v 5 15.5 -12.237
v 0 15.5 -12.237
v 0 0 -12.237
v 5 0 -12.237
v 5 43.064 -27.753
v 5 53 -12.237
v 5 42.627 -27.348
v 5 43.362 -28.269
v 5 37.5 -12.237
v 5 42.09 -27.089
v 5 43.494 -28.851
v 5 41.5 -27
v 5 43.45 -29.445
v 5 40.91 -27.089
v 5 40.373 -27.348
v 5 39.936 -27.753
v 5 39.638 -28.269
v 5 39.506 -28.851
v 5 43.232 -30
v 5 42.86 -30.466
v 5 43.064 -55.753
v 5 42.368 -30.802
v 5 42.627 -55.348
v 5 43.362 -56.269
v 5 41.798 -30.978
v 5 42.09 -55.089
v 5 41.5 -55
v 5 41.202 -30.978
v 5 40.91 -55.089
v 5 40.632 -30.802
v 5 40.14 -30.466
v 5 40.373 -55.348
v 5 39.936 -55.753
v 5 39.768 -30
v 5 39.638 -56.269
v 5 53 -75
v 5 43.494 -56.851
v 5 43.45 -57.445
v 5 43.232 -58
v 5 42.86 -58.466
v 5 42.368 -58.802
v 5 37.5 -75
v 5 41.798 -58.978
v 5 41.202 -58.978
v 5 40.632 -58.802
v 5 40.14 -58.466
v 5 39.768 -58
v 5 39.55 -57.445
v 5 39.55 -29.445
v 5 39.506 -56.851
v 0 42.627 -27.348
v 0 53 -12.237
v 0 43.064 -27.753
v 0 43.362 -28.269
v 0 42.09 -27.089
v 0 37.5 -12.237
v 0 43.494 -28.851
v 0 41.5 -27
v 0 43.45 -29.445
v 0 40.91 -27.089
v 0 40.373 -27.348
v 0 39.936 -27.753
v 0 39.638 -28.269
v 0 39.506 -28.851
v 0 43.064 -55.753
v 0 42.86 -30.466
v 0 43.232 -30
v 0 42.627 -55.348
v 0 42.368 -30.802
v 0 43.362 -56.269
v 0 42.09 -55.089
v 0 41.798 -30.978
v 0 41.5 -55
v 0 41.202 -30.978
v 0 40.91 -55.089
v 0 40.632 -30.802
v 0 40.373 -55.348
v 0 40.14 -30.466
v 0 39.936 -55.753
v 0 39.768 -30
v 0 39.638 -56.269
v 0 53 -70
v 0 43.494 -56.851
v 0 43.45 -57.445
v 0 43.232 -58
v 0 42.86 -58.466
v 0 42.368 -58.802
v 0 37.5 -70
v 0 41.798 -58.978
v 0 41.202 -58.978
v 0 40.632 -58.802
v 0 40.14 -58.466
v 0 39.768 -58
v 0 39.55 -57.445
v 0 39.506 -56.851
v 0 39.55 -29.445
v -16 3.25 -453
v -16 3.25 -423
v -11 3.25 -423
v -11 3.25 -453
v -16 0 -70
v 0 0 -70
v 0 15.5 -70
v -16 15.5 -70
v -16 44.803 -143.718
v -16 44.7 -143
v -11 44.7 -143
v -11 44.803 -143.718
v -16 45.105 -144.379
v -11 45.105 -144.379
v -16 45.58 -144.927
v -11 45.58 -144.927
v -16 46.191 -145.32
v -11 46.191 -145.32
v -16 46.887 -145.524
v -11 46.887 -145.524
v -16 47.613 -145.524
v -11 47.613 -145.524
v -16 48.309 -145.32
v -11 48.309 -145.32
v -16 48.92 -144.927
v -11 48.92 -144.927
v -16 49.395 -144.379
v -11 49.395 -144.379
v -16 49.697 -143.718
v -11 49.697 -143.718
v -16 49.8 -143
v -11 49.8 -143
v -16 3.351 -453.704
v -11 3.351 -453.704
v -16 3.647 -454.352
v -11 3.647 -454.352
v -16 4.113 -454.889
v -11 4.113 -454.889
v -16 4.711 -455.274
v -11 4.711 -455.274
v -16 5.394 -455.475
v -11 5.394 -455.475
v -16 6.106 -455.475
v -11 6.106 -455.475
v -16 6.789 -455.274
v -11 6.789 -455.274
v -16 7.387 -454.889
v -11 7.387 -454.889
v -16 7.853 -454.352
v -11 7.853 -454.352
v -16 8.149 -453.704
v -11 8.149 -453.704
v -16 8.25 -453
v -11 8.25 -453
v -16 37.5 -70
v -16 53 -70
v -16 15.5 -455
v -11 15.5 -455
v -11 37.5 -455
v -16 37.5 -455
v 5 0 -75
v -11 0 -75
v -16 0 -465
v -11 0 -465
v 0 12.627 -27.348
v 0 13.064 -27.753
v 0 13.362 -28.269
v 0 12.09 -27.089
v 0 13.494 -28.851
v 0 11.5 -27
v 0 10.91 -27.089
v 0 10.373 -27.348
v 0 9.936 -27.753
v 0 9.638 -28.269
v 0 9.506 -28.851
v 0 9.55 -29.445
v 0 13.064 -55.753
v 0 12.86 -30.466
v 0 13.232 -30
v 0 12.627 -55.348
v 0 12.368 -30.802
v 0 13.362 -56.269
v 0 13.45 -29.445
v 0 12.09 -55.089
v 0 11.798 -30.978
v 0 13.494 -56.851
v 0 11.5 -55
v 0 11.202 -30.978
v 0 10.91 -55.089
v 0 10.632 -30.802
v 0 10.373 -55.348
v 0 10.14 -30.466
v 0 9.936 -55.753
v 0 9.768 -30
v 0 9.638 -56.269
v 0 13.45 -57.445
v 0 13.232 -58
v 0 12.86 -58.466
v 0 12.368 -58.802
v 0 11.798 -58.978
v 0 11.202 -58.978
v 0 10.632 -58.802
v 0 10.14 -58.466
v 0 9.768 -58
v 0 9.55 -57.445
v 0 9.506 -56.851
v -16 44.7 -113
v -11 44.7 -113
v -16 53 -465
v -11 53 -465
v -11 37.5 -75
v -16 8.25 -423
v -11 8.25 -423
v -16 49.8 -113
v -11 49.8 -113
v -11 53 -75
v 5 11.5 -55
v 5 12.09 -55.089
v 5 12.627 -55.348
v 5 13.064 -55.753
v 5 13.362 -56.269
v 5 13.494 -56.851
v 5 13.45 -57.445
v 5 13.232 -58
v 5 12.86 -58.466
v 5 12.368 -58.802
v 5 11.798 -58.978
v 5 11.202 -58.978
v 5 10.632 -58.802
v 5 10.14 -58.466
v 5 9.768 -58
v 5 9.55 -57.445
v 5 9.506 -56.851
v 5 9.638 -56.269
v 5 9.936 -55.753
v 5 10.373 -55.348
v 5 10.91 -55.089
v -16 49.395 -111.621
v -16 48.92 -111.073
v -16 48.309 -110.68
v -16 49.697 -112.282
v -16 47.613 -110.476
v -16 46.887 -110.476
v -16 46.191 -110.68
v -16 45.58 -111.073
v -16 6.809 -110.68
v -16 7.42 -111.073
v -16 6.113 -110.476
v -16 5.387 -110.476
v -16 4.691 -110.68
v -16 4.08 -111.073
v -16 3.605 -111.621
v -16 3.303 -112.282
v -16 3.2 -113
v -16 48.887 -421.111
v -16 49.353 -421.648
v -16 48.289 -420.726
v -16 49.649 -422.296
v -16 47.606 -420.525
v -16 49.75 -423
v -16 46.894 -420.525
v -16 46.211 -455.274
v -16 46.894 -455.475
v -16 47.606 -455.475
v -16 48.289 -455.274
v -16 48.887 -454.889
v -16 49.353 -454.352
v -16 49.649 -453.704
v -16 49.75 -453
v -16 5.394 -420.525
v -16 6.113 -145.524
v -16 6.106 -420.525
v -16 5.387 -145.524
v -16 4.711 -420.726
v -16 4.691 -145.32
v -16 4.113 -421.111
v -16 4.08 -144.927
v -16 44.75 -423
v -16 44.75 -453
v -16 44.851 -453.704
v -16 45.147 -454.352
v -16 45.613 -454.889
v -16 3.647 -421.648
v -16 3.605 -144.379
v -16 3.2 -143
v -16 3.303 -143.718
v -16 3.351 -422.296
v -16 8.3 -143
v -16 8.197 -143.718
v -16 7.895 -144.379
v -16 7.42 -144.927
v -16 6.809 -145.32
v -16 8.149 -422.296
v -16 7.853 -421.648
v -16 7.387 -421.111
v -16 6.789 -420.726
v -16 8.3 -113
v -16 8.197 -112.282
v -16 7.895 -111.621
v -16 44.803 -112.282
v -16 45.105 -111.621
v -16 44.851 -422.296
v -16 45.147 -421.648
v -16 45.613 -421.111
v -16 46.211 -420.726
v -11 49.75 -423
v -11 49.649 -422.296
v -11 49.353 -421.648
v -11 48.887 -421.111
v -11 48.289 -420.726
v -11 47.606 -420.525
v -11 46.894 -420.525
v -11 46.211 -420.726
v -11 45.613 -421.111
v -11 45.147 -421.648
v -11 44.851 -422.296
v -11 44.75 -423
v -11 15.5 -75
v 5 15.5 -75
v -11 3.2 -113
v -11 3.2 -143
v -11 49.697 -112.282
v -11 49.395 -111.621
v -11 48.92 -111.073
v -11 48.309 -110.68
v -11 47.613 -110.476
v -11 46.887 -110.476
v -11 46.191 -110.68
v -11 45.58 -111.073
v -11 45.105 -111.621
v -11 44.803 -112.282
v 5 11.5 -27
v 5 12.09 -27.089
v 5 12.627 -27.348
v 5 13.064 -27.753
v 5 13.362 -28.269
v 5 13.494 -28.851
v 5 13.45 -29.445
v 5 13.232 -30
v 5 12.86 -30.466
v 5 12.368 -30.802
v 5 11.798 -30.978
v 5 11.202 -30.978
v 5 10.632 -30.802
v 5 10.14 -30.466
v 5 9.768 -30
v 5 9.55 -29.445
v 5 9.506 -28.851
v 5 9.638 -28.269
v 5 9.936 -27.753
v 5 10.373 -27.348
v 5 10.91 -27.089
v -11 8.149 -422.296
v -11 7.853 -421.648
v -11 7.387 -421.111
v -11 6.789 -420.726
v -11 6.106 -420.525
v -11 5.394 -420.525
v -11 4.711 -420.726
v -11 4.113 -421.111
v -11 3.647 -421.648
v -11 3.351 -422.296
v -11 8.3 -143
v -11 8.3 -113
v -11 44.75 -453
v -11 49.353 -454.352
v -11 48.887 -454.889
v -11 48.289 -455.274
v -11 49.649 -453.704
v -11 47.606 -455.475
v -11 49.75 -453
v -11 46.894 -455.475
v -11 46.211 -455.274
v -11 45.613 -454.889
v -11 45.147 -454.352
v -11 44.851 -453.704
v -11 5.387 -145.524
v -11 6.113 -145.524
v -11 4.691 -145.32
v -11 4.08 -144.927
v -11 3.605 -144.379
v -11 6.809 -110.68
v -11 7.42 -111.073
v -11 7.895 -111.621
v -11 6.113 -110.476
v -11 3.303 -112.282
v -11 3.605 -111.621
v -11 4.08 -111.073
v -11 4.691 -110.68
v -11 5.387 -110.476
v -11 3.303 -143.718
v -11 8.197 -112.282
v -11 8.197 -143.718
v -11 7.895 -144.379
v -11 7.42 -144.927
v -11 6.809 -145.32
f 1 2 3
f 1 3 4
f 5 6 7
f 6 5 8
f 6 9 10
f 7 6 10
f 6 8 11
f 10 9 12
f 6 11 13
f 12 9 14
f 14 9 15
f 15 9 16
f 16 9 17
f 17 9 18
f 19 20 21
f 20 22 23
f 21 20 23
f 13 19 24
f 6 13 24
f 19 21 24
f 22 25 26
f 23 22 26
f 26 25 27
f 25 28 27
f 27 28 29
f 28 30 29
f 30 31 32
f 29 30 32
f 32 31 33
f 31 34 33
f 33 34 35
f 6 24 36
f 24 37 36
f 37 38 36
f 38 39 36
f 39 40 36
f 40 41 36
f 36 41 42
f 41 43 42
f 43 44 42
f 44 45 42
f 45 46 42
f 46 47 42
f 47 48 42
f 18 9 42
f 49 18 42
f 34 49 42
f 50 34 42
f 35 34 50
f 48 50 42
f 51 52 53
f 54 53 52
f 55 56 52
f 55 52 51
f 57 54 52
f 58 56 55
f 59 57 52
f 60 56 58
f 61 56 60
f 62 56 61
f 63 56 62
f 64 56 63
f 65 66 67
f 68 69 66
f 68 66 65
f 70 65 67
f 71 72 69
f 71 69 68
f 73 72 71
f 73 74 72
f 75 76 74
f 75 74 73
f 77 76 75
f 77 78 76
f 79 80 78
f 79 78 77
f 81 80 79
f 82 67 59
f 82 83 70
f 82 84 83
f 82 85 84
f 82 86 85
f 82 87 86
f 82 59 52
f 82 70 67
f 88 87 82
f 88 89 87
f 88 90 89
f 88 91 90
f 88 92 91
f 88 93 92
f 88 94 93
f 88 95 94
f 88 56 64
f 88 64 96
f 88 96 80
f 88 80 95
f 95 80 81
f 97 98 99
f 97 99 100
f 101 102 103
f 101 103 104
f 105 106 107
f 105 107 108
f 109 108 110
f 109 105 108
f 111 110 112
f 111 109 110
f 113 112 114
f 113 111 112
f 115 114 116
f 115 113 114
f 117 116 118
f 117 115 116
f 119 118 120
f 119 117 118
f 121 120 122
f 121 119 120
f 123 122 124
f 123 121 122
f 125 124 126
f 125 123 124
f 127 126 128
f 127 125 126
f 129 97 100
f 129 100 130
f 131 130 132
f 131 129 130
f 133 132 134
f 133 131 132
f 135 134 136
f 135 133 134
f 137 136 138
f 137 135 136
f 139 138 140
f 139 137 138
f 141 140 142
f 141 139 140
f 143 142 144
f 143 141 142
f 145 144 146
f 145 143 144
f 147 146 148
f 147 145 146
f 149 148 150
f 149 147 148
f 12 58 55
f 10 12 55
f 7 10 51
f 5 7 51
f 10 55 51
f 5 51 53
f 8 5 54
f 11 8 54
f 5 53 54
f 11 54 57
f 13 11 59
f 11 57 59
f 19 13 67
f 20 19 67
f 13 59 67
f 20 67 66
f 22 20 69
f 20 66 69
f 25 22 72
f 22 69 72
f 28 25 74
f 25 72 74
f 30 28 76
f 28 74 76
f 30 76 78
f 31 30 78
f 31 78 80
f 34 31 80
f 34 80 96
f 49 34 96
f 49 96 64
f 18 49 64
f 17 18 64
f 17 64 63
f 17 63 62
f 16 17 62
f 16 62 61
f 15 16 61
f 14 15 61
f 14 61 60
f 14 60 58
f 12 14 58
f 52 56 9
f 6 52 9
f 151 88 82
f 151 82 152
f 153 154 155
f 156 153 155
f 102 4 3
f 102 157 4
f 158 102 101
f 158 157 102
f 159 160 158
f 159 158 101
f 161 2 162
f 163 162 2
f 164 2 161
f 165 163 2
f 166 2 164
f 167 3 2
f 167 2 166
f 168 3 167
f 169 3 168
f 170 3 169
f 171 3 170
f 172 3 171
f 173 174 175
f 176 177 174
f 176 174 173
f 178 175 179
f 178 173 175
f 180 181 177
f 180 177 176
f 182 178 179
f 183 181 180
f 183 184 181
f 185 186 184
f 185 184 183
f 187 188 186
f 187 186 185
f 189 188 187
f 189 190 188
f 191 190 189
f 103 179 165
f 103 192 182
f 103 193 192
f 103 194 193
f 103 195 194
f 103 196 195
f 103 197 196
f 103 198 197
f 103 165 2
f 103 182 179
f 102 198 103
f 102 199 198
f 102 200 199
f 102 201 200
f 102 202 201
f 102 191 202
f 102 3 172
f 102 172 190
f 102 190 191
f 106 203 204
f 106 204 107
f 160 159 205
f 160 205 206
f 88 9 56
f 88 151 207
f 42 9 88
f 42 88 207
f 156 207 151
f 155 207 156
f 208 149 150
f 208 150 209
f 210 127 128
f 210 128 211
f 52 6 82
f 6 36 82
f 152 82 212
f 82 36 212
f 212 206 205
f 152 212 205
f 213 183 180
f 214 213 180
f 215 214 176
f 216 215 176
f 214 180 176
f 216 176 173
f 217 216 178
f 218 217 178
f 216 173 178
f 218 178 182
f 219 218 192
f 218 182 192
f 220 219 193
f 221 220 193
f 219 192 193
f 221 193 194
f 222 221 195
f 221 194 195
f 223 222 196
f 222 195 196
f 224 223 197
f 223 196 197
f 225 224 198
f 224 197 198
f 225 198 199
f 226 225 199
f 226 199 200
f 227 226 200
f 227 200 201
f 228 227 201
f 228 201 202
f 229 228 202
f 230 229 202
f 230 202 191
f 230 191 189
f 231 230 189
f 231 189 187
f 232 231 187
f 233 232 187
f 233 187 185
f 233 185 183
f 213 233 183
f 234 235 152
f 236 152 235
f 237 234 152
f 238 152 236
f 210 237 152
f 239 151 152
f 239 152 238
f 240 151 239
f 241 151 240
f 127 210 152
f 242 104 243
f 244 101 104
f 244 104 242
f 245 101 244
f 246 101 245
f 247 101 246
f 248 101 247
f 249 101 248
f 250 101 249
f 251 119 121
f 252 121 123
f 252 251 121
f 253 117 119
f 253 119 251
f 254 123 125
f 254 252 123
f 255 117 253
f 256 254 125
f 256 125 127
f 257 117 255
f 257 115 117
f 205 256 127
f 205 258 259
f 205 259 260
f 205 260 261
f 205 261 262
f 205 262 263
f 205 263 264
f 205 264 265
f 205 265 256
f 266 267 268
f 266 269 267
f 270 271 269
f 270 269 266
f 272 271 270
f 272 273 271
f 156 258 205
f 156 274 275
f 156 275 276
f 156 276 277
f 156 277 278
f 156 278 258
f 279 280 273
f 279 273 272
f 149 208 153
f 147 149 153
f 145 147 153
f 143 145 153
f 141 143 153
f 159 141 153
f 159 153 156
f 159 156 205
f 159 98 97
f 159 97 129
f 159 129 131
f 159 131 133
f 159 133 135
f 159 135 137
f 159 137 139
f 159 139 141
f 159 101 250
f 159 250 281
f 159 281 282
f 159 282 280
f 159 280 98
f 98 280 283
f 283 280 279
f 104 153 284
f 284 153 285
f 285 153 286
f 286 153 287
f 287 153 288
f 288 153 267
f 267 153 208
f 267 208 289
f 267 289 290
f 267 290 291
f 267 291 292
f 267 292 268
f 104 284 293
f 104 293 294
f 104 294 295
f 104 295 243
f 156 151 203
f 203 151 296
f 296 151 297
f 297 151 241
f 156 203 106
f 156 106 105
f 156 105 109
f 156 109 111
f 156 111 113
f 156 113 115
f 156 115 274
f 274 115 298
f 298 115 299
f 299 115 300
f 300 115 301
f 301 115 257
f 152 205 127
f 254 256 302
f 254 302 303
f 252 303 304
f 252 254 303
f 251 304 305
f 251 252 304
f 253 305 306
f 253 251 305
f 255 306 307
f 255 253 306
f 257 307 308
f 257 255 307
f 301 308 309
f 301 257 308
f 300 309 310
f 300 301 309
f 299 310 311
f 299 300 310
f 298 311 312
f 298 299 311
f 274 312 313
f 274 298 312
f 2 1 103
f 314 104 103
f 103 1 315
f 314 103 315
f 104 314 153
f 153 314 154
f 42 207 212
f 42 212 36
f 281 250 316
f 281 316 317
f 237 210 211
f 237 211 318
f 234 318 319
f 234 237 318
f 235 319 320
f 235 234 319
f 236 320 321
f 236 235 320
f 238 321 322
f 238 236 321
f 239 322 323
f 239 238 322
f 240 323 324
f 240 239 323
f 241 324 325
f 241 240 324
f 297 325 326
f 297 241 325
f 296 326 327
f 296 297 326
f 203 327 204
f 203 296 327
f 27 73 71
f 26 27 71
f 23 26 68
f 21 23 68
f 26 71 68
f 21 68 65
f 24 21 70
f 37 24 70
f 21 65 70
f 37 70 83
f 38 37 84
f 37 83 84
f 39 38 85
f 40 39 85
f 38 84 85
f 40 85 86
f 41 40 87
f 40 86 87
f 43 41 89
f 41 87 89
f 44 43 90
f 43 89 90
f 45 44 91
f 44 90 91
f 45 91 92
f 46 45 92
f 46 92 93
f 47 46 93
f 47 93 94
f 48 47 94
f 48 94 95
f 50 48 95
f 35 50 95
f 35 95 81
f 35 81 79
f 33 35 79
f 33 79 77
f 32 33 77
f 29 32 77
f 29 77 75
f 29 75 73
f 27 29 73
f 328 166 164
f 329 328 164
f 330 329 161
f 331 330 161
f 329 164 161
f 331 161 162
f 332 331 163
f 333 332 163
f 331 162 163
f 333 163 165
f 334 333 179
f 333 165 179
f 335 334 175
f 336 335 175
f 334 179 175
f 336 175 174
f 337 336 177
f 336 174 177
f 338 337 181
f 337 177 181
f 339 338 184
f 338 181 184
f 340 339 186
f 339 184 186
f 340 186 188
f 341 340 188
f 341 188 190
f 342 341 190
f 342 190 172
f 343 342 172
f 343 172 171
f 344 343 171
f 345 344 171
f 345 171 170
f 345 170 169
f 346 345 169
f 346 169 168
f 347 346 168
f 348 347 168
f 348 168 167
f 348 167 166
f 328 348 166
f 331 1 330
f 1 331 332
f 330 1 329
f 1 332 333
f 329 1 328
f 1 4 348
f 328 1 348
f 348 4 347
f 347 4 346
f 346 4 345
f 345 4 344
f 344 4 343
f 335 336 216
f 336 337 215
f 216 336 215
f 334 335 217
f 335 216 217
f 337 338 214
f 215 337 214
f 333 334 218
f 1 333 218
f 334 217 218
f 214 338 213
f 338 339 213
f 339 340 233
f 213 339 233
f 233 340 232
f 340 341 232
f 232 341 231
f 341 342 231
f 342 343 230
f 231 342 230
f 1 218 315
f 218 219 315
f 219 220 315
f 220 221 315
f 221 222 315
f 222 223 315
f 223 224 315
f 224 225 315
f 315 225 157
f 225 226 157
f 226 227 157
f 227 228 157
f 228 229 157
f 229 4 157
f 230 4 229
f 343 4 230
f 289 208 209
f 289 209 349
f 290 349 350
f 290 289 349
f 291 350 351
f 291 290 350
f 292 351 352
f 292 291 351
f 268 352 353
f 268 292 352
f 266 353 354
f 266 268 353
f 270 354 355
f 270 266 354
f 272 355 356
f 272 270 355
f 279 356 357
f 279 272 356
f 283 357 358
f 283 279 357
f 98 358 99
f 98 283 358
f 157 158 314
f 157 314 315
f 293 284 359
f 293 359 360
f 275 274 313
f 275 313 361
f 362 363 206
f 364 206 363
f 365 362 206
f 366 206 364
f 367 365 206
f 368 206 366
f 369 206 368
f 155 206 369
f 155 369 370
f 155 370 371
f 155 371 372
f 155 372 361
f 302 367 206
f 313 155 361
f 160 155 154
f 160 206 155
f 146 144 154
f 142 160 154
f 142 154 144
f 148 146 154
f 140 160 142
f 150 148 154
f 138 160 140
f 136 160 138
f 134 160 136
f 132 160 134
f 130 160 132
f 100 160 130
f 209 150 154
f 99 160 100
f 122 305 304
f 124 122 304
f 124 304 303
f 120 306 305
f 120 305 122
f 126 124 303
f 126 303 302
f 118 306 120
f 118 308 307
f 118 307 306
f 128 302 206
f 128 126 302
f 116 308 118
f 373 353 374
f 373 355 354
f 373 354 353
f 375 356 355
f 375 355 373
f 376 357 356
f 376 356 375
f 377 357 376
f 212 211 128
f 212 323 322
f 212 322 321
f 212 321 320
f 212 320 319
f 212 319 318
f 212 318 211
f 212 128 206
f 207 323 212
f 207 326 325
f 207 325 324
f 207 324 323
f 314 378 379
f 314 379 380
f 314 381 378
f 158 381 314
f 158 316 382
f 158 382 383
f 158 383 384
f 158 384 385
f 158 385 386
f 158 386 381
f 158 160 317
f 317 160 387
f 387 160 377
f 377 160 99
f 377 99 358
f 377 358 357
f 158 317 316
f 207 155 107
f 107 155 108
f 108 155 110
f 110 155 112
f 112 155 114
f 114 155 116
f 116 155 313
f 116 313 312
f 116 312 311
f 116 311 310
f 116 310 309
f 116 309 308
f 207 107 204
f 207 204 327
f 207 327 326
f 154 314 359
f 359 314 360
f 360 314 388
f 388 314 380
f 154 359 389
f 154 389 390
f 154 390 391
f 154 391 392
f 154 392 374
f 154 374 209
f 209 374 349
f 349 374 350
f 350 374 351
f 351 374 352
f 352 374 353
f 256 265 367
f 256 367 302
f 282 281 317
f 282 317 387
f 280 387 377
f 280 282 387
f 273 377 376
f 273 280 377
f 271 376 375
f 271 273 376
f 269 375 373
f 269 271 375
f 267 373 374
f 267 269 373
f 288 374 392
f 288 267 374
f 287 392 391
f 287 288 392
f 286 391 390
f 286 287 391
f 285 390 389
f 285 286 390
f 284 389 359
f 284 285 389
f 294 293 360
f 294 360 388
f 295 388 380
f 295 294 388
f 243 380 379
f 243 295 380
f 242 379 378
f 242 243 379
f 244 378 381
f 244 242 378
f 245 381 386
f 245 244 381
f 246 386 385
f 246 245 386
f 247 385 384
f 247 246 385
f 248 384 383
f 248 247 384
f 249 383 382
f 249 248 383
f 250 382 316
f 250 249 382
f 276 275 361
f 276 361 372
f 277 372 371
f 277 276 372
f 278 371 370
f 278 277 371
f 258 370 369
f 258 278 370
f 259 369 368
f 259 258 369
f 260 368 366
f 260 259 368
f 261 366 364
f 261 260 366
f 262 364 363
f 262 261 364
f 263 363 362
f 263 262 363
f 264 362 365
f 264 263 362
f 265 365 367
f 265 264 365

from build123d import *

# Parameters (mm, degrees)
EXTRUDE_1_DEPTH     = 53
CUT_EXTRUDE_2_REACH = 472.389
SKETCH_2_W          = 75
SKETCH_2_H          = 22
CUT_EXTRUDE_5_REACH = 471.913
SKETCH_4_R          = 2
CUT_EXTRUDE_6_REACH = 471.052
SKETCH_3_W          = 380
SKETCH_3_H          = 22
CUT_EXTRUDE_7_REACH = 470.746
SKETCH_6_W          = 93.868990514
SKETCH_6_H          = 40.944884918
CUT_EXTRUDE_8_DEPTH = 470.912954074


with BuildPart() as part:
    # 草图1 → 凸台-拉伸1 (new body)
    with BuildSketch(Plane(origin=(0, 0, 0), x_dir=(1, 0, 0), z_dir=(0, 1, 0))):
        Polygon((0, 0), (0, 70), (-16, 70), (-16, 465), (-11, 465), (-11, 75), (5, 75), (5, 0), (5, -16.047693785), (-42.239607079, -16.047693785), (-42.239607079, 0), align=None)
    extrude(amount=EXTRUDE_1_DEPTH)

    # 草图2 → 切除-拉伸2 (cut, up to next)
    with BuildSketch(Plane(origin=(5, 0, 0), x_dir=(0, 0, -1), z_dir=(1, 0, 0)), mode=Mode.PRIVATE) as cut_extrude_2_sk1:
        with Locations((37.5, 26.5)):
            Rectangle(SKETCH_2_W, SKETCH_2_H)
    cut_extrude_2_tool1 = extrude(cut_extrude_2_sk1.sketch, amount=-CUT_EXTRUDE_2_REACH, mode=Mode.PRIVATE) & part.part
    add(cut_extrude_2_tool1.solids().sort_by_distance((5, 26.5, -37.5))[0], mode=Mode.SUBTRACT)

    # 草图4 → 切除-拉伸5 (cut, up to next)
    with BuildSketch(Plane.ZY, mode=Mode.PRIVATE) as cut_extrude_5_sk1:
        with Locations((-57, 11.5)):
            Circle(SKETCH_4_R)
    cut_extrude_5_tool1 = extrude(cut_extrude_5_sk1.sketch, amount=-CUT_EXTRUDE_5_REACH, mode=Mode.PRIVATE) & part.part
    # 草图4 → 切除-拉伸5 (cut, up to next)
    with BuildSketch(Plane.ZY, mode=Mode.PRIVATE) as cut_extrude_5_sk2:
        with Locations((-57, 41.5)):
            Circle(SKETCH_4_R)
    cut_extrude_5_tool2 = extrude(cut_extrude_5_sk2.sketch, amount=-CUT_EXTRUDE_5_REACH, mode=Mode.PRIVATE) & part.part
    # 草图4 → 切除-拉伸5 (cut, up to next)
    with BuildSketch(Plane.ZY, mode=Mode.PRIVATE) as cut_extrude_5_sk3:
        with Locations((-29, 11.5)):
            Circle(SKETCH_4_R)
    cut_extrude_5_tool3 = extrude(cut_extrude_5_sk3.sketch, amount=-CUT_EXTRUDE_5_REACH, mode=Mode.PRIVATE) & part.part
    # 草图4 → 切除-拉伸5 (cut, up to next)
    with BuildSketch(Plane.ZY, mode=Mode.PRIVATE) as cut_extrude_5_sk4:
        with Locations((-29, 41.5)):
            Circle(SKETCH_4_R)
    cut_extrude_5_tool4 = extrude(cut_extrude_5_sk4.sketch, amount=-CUT_EXTRUDE_5_REACH, mode=Mode.PRIVATE) & part.part
    add(cut_extrude_5_tool1.solids().sort_by_distance((0, 11.5, -57))[0], mode=Mode.SUBTRACT)
    add(cut_extrude_5_tool2.solids().sort_by_distance((0, 41.5, -57))[0], mode=Mode.SUBTRACT)
    add(cut_extrude_5_tool3.solids().sort_by_distance((0, 11.5, -29))[0], mode=Mode.SUBTRACT)
    add(cut_extrude_5_tool4.solids().sort_by_distance((0, 41.5, -29))[0], mode=Mode.SUBTRACT)

    # 草图3 → 切除-拉伸6 (cut, up to next)
    with BuildSketch(Plane(origin=(-11, 0, 0), x_dir=(0, 0, -1), z_dir=(1, 0, 0)), mode=Mode.PRIVATE) as cut_extrude_6_sk1:
        with Locations((265, 26.5)):
            Rectangle(SKETCH_3_W, SKETCH_3_H)
    cut_extrude_6_tool1 = extrude(cut_extrude_6_sk1.sketch, amount=-CUT_EXTRUDE_6_REACH, mode=Mode.PRIVATE) & part.part
    add(cut_extrude_6_tool1.solids().sort_by_distance((-11, 26.5, -265))[0], mode=Mode.SUBTRACT)

    # 草图5 → 切除-拉伸7 (cut, up to next)
    with BuildSketch(Plane.ZY.offset(16), mode=Mode.PRIVATE) as cut_extrude_7_sk1:
        with BuildLine():
            Line((-143, 8.3), (-113, 8.3))
            ThreePointArc((-113, 8.3), (-110.45, 5.75), (-113, 3.2))
            Line((-113, 3.2), (-143, 3.2))
            ThreePointArc((-143, 3.2), (-145.55, 5.75), (-143, 8.3))
        make_face()
    cut_extrude_7_tool1 = extrude(cut_extrude_7_sk1.sketch, amount=-CUT_EXTRUDE_7_REACH, mode=Mode.PRIVATE) & part.part
    # 草图5 → 切除-拉伸7 (cut, up to next)
    with BuildSketch(Plane.ZY.offset(16), mode=Mode.PRIVATE) as cut_extrude_7_sk2:
        with BuildLine():
            Line((-143, 49.8), (-113, 49.8))
            ThreePointArc((-113, 49.8), (-110.45, 47.25), (-113, 44.7))
            Line((-113, 44.7), (-143, 44.7))
            ThreePointArc((-143, 44.7), (-145.55, 47.25), (-143, 49.8))
        make_face()
    cut_extrude_7_tool2 = extrude(cut_extrude_7_sk2.sketch, amount=-CUT_EXTRUDE_7_REACH, mode=Mode.PRIVATE) & part.part
    # 草图5 → 切除-拉伸7 (cut, up to next)
    with BuildSketch(Plane.ZY.offset(16), mode=Mode.PRIVATE) as cut_extrude_7_sk3:
        with BuildLine():
            Line((-423, 3.25), (-453, 3.25))
            ThreePointArc((-453, 3.25), (-455.5, 5.75), (-453, 8.25))
            Line((-453, 8.25), (-423, 8.25))
            ThreePointArc((-423, 8.25), (-420.5, 5.75), (-423, 3.25))
        make_face()
    cut_extrude_7_tool3 = extrude(cut_extrude_7_sk3.sketch, amount=-CUT_EXTRUDE_7_REACH, mode=Mode.PRIVATE) & part.part
    # 草图5 → 切除-拉伸7 (cut, up to next)
    with BuildSketch(Plane.ZY.offset(16), mode=Mode.PRIVATE) as cut_extrude_7_sk4:
        with BuildLine():
            Line((-423, 44.75), (-453, 44.75))
            ThreePointArc((-453, 44.75), (-455.5, 47.25), (-453, 49.75))
            Line((-453, 49.75), (-423, 49.75))
            ThreePointArc((-423, 49.75), (-420.5, 47.25), (-423, 44.75))
        make_face()
    cut_extrude_7_tool4 = extrude(cut_extrude_7_sk4.sketch, amount=-CUT_EXTRUDE_7_REACH, mode=Mode.PRIVATE) & part.part
    add(cut_extrude_7_tool1.solids().sort_by_distance((-16, 5.75, -128))[0], mode=Mode.SUBTRACT)
    add(cut_extrude_7_tool2.solids().sort_by_distance((-16, 47.25, -128))[0], mode=Mode.SUBTRACT)
    add(cut_extrude_7_tool3.solids().sort_by_distance((-16, 5.75, -438))[0], mode=Mode.SUBTRACT)
    add(cut_extrude_7_tool4.solids().sort_by_distance((-16, 47.25, -438))[0], mode=Mode.SUBTRACT)

    # 草图6 → 切除-拉伸8 (cut, through all)
    with BuildSketch(Plane(origin=(0, 53, 0), x_dir=(1, 0, 0), z_dir=(0, 1, 0))):
        with Locations((-15.853082152, -8.235463886)):
            Rectangle(SKETCH_6_W, SKETCH_6_H)
    extrude(amount=-CUT_EXTRUDE_8_DEPTH, mode=Mode.SUBTRACT)


solid = part.part
